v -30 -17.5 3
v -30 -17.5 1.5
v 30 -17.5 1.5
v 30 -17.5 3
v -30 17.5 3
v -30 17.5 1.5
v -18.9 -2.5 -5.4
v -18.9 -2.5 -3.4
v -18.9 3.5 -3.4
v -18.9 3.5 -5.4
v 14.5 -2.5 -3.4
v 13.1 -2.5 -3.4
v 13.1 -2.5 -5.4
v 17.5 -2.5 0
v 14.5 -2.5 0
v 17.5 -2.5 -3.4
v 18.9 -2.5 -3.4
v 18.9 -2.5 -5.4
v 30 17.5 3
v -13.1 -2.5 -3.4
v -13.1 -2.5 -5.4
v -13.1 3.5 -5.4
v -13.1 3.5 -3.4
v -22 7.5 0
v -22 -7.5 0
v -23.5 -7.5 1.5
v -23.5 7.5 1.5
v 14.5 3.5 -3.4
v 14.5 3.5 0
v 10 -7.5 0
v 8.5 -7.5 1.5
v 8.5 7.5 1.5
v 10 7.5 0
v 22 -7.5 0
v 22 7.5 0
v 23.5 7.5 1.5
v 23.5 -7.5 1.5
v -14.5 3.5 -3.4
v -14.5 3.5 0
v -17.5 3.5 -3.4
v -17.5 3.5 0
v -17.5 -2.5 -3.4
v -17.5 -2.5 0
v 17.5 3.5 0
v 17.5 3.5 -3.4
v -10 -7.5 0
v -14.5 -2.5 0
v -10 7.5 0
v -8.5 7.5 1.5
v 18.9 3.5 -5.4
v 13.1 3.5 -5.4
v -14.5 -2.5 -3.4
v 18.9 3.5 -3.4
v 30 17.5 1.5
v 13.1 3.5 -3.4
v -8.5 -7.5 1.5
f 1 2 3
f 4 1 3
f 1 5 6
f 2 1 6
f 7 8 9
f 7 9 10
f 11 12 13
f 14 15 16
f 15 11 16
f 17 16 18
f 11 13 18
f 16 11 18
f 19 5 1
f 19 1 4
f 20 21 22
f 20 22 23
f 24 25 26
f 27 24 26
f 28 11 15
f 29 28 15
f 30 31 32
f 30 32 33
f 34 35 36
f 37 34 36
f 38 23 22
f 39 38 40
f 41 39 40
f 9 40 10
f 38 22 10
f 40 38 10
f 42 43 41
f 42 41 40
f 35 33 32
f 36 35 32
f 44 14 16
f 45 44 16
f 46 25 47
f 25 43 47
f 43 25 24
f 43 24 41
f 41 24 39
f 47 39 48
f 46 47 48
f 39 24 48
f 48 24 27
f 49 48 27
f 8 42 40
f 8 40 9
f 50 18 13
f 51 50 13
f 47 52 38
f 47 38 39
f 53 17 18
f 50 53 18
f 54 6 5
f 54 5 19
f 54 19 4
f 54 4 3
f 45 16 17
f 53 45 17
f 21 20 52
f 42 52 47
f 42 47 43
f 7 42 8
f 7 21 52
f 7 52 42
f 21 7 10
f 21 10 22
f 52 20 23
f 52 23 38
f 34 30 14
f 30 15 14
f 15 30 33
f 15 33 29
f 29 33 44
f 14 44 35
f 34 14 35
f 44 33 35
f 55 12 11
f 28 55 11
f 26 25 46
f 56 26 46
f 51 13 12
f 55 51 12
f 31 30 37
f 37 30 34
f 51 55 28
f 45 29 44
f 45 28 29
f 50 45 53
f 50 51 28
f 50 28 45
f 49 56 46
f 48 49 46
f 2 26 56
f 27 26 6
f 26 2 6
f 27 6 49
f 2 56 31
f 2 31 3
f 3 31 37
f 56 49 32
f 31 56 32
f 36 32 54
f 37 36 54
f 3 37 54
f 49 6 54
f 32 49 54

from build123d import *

# Parameters (mm, degrees)
SKETCH1_W           = 60
SKETCH1_H           = 15
BOSS_EXTRUDE1_DEPTH = 3
BOSS_EXTRUDE2_DEPTH = 6
CUT_EXTRUDE1_DEPTH  = 34.972930401
SKETCH5_W           = 60
SKETCH5_H           = 1.5
BOSS_EXTRUDE3_DEPTH = 10


with BuildPart() as part:
    # Sketch1 → Boss-Extrude1 (new body)
    with BuildSketch(Plane.XY):
        Rectangle(SKETCH1_W, SKETCH1_H)
    extrude(amount=BOSS_EXTRUDE1_DEPTH)

    # Sketch3 → Boss-Extrude2 (add)
    with BuildSketch(Plane(origin=(0, -2.5, 0), x_dir=(-1, 0, 0), z_dir=(0, -1, 0))):
        Polygon((-14.5, 0), (-17.5, 0), (-17.5, 3.4), (-18.9, 3.4), (-18.9, 5.4), (-13.1, 5.4), (-13.1, 3.4), (-14.5, 3.4), align=None)
        Polygon((14.5, 3.4), (14.5, 0), (17.5, 0), (17.5, 3.4), (18.9, 3.4), (18.9, 5.4), (13.1, 5.4), (13.1, 3.4), align=None)
    extrude(amount=-BOSS_EXTRUDE2_DEPTH)

    # Sketch4 → Cut-Extrude1 (cut, through all)
    with BuildSketch(Plane(origin=(0, 7.5, 0), x_dir=(1, 0, 0), z_dir=(0, 1, 0))):
        Polygon((30, 0), (22, 0), (23.5, -1.5), (30, -1.5), align=None)
        Polygon((0, 0), (0, -1.5), (8.5, -1.5), (10, 0), align=None)
    cut_extrude1 = extrude(amount=-CUT_EXTRUDE1_DEPTH, mode=Mode.SUBTRACT)

    # Mirror1: Cut-Extrude1 across plane
    add(cut_extrude1.mirror(Plane(origin=(0, 0, 0), x_dir=(0, 0, 1), z_dir=(1, 0, 0))), mode=Mode.SUBTRACT)

    # Sketch5 → Boss-Extrude3 (add)
    with BuildSketch(Plane(origin=(0, 7.5, 0), x_dir=(1, 0, 0), z_dir=(0, 1, 0))):
        with Locations((0, -2.25)):
            Rectangle(SKETCH5_W, SKETCH5_H)
    boss_extrude3 = extrude(amount=BOSS_EXTRUDE3_DEPTH)

    # Mirror2: Boss-Extrude3 across plane
    add(boss_extrude3.mirror(Plane.ZX))


solid = part.part
